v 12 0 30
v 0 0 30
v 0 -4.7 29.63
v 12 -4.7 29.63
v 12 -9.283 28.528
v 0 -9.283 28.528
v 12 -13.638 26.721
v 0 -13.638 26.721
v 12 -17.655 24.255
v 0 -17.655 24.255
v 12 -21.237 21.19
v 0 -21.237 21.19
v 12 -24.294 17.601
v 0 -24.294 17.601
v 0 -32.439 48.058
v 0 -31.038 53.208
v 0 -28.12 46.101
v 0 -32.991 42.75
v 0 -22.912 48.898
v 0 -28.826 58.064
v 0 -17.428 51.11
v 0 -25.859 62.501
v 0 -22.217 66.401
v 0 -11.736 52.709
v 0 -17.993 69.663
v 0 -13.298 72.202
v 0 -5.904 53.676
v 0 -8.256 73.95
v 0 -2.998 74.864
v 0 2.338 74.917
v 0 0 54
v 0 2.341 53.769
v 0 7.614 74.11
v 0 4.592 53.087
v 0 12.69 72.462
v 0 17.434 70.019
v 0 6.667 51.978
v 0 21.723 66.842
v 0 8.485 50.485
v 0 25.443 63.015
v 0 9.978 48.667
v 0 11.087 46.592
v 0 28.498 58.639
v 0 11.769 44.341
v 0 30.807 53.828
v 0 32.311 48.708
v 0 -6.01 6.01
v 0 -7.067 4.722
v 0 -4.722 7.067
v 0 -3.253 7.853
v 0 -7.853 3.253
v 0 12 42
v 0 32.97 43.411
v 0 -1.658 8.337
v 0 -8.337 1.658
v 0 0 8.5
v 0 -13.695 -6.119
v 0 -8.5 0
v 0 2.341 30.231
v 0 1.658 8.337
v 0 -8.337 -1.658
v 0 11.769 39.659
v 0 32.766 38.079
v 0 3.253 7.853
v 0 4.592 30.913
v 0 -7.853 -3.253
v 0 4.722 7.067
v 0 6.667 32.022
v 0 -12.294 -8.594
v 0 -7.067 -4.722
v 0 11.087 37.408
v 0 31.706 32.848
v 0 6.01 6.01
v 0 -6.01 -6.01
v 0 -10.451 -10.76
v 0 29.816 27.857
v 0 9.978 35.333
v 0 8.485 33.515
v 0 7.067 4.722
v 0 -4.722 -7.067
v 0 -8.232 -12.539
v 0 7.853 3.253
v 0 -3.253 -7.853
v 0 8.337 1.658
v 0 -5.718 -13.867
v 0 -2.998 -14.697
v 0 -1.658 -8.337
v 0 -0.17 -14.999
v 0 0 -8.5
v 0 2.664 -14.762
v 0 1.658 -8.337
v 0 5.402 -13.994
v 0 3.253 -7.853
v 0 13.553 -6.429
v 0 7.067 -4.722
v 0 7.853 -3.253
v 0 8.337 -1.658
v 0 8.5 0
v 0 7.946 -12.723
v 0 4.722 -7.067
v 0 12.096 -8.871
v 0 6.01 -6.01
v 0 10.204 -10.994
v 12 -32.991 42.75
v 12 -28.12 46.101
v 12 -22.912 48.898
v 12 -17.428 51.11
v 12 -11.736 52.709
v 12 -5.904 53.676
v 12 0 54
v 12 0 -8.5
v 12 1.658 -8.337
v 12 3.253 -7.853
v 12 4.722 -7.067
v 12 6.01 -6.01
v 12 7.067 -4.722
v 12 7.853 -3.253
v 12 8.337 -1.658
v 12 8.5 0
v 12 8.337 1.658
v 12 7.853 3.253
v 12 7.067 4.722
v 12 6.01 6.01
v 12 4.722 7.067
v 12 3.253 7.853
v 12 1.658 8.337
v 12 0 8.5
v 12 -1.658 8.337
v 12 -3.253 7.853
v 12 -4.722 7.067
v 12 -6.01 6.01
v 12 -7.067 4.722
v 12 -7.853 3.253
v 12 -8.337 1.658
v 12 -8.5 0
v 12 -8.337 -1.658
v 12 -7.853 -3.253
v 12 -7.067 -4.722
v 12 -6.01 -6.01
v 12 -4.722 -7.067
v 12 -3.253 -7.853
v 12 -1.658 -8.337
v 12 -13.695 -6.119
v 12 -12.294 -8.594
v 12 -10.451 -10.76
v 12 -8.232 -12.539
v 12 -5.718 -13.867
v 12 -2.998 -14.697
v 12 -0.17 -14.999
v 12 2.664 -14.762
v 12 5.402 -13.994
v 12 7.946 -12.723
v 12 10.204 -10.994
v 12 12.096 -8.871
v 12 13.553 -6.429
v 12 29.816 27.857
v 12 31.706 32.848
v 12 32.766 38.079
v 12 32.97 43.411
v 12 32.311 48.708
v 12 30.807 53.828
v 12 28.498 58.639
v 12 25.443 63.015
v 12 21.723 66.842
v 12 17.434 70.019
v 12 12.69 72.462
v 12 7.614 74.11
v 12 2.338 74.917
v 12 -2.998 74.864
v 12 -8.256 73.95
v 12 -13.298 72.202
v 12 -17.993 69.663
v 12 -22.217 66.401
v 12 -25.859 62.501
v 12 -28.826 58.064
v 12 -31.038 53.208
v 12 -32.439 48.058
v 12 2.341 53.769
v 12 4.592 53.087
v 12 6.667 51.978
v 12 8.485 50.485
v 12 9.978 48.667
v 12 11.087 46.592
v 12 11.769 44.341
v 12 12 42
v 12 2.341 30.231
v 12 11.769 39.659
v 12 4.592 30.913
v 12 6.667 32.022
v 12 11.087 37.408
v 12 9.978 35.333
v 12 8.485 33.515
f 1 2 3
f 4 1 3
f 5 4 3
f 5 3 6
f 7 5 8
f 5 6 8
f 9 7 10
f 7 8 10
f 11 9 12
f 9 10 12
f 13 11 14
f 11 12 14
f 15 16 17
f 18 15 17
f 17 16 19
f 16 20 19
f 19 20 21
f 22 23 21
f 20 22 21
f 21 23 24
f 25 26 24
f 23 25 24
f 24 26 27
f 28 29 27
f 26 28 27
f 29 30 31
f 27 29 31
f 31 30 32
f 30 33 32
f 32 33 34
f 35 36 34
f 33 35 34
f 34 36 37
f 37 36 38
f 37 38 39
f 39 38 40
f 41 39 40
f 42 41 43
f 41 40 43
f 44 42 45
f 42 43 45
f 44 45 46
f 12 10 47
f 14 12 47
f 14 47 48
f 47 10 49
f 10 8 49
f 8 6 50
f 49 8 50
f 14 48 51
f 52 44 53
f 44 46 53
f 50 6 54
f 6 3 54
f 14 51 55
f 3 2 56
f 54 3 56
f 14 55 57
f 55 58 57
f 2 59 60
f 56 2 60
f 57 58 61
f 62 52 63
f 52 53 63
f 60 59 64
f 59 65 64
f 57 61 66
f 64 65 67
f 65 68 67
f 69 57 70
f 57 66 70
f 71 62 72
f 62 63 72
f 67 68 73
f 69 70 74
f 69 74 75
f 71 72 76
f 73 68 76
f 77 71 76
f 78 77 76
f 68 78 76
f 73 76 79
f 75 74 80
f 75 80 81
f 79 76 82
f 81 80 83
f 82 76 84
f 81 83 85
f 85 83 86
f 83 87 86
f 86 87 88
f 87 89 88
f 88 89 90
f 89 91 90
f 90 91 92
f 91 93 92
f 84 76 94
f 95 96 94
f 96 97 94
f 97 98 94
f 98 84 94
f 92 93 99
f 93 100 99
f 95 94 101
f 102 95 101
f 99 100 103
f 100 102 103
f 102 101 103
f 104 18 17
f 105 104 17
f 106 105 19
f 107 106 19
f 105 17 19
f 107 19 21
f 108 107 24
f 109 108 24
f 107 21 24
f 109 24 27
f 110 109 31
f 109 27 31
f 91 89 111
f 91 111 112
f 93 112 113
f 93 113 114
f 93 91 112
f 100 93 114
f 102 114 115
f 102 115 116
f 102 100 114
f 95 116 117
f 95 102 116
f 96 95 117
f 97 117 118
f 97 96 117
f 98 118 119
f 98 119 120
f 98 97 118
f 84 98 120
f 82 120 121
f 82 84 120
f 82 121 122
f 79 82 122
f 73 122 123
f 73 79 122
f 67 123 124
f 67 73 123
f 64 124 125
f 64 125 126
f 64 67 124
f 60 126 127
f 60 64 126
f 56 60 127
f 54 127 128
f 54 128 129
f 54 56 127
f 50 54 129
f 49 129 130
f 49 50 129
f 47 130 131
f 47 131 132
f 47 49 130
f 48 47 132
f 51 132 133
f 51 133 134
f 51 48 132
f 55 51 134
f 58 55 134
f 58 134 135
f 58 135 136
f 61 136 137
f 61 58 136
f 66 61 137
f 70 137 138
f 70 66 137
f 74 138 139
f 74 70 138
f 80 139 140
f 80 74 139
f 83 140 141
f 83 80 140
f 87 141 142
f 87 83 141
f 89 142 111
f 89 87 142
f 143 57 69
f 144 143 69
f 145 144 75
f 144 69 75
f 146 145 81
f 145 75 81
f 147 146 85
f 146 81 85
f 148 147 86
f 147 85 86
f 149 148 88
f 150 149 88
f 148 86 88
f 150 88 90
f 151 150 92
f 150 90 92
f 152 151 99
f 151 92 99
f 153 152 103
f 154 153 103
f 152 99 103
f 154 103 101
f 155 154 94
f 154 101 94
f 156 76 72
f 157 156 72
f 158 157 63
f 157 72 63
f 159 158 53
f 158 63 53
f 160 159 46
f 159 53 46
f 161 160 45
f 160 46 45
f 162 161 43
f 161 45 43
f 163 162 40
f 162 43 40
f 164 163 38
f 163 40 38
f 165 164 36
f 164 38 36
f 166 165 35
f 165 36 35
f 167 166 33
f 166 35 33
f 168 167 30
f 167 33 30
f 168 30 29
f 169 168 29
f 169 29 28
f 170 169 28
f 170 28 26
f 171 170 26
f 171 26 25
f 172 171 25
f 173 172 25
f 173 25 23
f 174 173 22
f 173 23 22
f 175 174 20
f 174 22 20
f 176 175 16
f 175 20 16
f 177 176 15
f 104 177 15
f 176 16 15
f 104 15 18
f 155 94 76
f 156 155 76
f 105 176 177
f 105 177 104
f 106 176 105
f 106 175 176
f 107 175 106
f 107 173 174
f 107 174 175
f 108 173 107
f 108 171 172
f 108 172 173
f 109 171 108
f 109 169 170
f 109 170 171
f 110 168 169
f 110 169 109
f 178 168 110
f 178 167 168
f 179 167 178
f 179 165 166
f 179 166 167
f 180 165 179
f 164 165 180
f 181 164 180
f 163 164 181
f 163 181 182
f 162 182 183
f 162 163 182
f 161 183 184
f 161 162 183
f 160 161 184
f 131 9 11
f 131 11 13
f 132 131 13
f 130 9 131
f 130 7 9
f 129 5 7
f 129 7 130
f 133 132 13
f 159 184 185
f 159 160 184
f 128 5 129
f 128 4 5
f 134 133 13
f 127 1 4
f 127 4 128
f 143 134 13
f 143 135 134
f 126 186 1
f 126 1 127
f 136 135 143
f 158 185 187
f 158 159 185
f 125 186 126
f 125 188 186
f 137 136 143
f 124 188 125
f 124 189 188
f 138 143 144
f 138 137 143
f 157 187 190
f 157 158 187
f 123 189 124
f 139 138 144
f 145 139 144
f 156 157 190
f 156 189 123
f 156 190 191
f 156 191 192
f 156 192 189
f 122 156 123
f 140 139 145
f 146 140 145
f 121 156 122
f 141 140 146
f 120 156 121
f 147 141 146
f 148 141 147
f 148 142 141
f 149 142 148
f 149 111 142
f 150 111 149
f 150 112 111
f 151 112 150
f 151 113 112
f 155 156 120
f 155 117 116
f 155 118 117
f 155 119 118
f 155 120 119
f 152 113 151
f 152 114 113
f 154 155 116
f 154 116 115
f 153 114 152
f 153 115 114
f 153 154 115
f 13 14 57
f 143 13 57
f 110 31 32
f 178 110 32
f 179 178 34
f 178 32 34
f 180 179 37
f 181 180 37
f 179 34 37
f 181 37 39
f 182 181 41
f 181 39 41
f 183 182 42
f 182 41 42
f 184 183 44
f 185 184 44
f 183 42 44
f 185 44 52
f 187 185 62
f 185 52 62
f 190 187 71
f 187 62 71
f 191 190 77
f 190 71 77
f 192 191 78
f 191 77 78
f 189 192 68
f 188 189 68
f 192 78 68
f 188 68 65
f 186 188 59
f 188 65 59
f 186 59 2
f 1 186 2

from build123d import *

# Parameters (mm, degrees)
SKETCH1_R           = 8.5
BOSS_EXTRUDE1_DEPTH = 12


with BuildPart() as part:
    # Sketch1 → Boss-Extrude1 (new body)
    with BuildSketch(Plane(origin=(0, 0, 0), x_dir=(0, 0, -1), z_dir=(1, 0, 0))):
        with BuildLine():
            Line((-17.601019721, -24.29411667), (6.119406169, -13.694994273))
            ThreePointArc((6.119406169, -13.694994273), (14.999034519, -0.170186666), (6.428571429, 13.552618544))
            Line((6.428571429, 13.552618544), (-27.857142857, 29.815760796))
            ThreePointArc((-27.857142857, 29.815760796), (-74.109646673, 7.613842033), (-42.75, -32.991476172))
            ThreePointArc((-42.75, -32.991476172), (-51.110175112, -17.428425058), (-54, 0))
            ThreePointArc((-54, 0), (-42, 12), (-30, 0))
            ThreePointArc((-30, 0), (-26.721064646, -13.637620914), (-17.601019721, -24.29411667))
        make_face()
        Circle(SKETCH1_R, mode=Mode.SUBTRACT)
    extrude(amount=BOSS_EXTRUDE1_DEPTH)


solid = part.part
